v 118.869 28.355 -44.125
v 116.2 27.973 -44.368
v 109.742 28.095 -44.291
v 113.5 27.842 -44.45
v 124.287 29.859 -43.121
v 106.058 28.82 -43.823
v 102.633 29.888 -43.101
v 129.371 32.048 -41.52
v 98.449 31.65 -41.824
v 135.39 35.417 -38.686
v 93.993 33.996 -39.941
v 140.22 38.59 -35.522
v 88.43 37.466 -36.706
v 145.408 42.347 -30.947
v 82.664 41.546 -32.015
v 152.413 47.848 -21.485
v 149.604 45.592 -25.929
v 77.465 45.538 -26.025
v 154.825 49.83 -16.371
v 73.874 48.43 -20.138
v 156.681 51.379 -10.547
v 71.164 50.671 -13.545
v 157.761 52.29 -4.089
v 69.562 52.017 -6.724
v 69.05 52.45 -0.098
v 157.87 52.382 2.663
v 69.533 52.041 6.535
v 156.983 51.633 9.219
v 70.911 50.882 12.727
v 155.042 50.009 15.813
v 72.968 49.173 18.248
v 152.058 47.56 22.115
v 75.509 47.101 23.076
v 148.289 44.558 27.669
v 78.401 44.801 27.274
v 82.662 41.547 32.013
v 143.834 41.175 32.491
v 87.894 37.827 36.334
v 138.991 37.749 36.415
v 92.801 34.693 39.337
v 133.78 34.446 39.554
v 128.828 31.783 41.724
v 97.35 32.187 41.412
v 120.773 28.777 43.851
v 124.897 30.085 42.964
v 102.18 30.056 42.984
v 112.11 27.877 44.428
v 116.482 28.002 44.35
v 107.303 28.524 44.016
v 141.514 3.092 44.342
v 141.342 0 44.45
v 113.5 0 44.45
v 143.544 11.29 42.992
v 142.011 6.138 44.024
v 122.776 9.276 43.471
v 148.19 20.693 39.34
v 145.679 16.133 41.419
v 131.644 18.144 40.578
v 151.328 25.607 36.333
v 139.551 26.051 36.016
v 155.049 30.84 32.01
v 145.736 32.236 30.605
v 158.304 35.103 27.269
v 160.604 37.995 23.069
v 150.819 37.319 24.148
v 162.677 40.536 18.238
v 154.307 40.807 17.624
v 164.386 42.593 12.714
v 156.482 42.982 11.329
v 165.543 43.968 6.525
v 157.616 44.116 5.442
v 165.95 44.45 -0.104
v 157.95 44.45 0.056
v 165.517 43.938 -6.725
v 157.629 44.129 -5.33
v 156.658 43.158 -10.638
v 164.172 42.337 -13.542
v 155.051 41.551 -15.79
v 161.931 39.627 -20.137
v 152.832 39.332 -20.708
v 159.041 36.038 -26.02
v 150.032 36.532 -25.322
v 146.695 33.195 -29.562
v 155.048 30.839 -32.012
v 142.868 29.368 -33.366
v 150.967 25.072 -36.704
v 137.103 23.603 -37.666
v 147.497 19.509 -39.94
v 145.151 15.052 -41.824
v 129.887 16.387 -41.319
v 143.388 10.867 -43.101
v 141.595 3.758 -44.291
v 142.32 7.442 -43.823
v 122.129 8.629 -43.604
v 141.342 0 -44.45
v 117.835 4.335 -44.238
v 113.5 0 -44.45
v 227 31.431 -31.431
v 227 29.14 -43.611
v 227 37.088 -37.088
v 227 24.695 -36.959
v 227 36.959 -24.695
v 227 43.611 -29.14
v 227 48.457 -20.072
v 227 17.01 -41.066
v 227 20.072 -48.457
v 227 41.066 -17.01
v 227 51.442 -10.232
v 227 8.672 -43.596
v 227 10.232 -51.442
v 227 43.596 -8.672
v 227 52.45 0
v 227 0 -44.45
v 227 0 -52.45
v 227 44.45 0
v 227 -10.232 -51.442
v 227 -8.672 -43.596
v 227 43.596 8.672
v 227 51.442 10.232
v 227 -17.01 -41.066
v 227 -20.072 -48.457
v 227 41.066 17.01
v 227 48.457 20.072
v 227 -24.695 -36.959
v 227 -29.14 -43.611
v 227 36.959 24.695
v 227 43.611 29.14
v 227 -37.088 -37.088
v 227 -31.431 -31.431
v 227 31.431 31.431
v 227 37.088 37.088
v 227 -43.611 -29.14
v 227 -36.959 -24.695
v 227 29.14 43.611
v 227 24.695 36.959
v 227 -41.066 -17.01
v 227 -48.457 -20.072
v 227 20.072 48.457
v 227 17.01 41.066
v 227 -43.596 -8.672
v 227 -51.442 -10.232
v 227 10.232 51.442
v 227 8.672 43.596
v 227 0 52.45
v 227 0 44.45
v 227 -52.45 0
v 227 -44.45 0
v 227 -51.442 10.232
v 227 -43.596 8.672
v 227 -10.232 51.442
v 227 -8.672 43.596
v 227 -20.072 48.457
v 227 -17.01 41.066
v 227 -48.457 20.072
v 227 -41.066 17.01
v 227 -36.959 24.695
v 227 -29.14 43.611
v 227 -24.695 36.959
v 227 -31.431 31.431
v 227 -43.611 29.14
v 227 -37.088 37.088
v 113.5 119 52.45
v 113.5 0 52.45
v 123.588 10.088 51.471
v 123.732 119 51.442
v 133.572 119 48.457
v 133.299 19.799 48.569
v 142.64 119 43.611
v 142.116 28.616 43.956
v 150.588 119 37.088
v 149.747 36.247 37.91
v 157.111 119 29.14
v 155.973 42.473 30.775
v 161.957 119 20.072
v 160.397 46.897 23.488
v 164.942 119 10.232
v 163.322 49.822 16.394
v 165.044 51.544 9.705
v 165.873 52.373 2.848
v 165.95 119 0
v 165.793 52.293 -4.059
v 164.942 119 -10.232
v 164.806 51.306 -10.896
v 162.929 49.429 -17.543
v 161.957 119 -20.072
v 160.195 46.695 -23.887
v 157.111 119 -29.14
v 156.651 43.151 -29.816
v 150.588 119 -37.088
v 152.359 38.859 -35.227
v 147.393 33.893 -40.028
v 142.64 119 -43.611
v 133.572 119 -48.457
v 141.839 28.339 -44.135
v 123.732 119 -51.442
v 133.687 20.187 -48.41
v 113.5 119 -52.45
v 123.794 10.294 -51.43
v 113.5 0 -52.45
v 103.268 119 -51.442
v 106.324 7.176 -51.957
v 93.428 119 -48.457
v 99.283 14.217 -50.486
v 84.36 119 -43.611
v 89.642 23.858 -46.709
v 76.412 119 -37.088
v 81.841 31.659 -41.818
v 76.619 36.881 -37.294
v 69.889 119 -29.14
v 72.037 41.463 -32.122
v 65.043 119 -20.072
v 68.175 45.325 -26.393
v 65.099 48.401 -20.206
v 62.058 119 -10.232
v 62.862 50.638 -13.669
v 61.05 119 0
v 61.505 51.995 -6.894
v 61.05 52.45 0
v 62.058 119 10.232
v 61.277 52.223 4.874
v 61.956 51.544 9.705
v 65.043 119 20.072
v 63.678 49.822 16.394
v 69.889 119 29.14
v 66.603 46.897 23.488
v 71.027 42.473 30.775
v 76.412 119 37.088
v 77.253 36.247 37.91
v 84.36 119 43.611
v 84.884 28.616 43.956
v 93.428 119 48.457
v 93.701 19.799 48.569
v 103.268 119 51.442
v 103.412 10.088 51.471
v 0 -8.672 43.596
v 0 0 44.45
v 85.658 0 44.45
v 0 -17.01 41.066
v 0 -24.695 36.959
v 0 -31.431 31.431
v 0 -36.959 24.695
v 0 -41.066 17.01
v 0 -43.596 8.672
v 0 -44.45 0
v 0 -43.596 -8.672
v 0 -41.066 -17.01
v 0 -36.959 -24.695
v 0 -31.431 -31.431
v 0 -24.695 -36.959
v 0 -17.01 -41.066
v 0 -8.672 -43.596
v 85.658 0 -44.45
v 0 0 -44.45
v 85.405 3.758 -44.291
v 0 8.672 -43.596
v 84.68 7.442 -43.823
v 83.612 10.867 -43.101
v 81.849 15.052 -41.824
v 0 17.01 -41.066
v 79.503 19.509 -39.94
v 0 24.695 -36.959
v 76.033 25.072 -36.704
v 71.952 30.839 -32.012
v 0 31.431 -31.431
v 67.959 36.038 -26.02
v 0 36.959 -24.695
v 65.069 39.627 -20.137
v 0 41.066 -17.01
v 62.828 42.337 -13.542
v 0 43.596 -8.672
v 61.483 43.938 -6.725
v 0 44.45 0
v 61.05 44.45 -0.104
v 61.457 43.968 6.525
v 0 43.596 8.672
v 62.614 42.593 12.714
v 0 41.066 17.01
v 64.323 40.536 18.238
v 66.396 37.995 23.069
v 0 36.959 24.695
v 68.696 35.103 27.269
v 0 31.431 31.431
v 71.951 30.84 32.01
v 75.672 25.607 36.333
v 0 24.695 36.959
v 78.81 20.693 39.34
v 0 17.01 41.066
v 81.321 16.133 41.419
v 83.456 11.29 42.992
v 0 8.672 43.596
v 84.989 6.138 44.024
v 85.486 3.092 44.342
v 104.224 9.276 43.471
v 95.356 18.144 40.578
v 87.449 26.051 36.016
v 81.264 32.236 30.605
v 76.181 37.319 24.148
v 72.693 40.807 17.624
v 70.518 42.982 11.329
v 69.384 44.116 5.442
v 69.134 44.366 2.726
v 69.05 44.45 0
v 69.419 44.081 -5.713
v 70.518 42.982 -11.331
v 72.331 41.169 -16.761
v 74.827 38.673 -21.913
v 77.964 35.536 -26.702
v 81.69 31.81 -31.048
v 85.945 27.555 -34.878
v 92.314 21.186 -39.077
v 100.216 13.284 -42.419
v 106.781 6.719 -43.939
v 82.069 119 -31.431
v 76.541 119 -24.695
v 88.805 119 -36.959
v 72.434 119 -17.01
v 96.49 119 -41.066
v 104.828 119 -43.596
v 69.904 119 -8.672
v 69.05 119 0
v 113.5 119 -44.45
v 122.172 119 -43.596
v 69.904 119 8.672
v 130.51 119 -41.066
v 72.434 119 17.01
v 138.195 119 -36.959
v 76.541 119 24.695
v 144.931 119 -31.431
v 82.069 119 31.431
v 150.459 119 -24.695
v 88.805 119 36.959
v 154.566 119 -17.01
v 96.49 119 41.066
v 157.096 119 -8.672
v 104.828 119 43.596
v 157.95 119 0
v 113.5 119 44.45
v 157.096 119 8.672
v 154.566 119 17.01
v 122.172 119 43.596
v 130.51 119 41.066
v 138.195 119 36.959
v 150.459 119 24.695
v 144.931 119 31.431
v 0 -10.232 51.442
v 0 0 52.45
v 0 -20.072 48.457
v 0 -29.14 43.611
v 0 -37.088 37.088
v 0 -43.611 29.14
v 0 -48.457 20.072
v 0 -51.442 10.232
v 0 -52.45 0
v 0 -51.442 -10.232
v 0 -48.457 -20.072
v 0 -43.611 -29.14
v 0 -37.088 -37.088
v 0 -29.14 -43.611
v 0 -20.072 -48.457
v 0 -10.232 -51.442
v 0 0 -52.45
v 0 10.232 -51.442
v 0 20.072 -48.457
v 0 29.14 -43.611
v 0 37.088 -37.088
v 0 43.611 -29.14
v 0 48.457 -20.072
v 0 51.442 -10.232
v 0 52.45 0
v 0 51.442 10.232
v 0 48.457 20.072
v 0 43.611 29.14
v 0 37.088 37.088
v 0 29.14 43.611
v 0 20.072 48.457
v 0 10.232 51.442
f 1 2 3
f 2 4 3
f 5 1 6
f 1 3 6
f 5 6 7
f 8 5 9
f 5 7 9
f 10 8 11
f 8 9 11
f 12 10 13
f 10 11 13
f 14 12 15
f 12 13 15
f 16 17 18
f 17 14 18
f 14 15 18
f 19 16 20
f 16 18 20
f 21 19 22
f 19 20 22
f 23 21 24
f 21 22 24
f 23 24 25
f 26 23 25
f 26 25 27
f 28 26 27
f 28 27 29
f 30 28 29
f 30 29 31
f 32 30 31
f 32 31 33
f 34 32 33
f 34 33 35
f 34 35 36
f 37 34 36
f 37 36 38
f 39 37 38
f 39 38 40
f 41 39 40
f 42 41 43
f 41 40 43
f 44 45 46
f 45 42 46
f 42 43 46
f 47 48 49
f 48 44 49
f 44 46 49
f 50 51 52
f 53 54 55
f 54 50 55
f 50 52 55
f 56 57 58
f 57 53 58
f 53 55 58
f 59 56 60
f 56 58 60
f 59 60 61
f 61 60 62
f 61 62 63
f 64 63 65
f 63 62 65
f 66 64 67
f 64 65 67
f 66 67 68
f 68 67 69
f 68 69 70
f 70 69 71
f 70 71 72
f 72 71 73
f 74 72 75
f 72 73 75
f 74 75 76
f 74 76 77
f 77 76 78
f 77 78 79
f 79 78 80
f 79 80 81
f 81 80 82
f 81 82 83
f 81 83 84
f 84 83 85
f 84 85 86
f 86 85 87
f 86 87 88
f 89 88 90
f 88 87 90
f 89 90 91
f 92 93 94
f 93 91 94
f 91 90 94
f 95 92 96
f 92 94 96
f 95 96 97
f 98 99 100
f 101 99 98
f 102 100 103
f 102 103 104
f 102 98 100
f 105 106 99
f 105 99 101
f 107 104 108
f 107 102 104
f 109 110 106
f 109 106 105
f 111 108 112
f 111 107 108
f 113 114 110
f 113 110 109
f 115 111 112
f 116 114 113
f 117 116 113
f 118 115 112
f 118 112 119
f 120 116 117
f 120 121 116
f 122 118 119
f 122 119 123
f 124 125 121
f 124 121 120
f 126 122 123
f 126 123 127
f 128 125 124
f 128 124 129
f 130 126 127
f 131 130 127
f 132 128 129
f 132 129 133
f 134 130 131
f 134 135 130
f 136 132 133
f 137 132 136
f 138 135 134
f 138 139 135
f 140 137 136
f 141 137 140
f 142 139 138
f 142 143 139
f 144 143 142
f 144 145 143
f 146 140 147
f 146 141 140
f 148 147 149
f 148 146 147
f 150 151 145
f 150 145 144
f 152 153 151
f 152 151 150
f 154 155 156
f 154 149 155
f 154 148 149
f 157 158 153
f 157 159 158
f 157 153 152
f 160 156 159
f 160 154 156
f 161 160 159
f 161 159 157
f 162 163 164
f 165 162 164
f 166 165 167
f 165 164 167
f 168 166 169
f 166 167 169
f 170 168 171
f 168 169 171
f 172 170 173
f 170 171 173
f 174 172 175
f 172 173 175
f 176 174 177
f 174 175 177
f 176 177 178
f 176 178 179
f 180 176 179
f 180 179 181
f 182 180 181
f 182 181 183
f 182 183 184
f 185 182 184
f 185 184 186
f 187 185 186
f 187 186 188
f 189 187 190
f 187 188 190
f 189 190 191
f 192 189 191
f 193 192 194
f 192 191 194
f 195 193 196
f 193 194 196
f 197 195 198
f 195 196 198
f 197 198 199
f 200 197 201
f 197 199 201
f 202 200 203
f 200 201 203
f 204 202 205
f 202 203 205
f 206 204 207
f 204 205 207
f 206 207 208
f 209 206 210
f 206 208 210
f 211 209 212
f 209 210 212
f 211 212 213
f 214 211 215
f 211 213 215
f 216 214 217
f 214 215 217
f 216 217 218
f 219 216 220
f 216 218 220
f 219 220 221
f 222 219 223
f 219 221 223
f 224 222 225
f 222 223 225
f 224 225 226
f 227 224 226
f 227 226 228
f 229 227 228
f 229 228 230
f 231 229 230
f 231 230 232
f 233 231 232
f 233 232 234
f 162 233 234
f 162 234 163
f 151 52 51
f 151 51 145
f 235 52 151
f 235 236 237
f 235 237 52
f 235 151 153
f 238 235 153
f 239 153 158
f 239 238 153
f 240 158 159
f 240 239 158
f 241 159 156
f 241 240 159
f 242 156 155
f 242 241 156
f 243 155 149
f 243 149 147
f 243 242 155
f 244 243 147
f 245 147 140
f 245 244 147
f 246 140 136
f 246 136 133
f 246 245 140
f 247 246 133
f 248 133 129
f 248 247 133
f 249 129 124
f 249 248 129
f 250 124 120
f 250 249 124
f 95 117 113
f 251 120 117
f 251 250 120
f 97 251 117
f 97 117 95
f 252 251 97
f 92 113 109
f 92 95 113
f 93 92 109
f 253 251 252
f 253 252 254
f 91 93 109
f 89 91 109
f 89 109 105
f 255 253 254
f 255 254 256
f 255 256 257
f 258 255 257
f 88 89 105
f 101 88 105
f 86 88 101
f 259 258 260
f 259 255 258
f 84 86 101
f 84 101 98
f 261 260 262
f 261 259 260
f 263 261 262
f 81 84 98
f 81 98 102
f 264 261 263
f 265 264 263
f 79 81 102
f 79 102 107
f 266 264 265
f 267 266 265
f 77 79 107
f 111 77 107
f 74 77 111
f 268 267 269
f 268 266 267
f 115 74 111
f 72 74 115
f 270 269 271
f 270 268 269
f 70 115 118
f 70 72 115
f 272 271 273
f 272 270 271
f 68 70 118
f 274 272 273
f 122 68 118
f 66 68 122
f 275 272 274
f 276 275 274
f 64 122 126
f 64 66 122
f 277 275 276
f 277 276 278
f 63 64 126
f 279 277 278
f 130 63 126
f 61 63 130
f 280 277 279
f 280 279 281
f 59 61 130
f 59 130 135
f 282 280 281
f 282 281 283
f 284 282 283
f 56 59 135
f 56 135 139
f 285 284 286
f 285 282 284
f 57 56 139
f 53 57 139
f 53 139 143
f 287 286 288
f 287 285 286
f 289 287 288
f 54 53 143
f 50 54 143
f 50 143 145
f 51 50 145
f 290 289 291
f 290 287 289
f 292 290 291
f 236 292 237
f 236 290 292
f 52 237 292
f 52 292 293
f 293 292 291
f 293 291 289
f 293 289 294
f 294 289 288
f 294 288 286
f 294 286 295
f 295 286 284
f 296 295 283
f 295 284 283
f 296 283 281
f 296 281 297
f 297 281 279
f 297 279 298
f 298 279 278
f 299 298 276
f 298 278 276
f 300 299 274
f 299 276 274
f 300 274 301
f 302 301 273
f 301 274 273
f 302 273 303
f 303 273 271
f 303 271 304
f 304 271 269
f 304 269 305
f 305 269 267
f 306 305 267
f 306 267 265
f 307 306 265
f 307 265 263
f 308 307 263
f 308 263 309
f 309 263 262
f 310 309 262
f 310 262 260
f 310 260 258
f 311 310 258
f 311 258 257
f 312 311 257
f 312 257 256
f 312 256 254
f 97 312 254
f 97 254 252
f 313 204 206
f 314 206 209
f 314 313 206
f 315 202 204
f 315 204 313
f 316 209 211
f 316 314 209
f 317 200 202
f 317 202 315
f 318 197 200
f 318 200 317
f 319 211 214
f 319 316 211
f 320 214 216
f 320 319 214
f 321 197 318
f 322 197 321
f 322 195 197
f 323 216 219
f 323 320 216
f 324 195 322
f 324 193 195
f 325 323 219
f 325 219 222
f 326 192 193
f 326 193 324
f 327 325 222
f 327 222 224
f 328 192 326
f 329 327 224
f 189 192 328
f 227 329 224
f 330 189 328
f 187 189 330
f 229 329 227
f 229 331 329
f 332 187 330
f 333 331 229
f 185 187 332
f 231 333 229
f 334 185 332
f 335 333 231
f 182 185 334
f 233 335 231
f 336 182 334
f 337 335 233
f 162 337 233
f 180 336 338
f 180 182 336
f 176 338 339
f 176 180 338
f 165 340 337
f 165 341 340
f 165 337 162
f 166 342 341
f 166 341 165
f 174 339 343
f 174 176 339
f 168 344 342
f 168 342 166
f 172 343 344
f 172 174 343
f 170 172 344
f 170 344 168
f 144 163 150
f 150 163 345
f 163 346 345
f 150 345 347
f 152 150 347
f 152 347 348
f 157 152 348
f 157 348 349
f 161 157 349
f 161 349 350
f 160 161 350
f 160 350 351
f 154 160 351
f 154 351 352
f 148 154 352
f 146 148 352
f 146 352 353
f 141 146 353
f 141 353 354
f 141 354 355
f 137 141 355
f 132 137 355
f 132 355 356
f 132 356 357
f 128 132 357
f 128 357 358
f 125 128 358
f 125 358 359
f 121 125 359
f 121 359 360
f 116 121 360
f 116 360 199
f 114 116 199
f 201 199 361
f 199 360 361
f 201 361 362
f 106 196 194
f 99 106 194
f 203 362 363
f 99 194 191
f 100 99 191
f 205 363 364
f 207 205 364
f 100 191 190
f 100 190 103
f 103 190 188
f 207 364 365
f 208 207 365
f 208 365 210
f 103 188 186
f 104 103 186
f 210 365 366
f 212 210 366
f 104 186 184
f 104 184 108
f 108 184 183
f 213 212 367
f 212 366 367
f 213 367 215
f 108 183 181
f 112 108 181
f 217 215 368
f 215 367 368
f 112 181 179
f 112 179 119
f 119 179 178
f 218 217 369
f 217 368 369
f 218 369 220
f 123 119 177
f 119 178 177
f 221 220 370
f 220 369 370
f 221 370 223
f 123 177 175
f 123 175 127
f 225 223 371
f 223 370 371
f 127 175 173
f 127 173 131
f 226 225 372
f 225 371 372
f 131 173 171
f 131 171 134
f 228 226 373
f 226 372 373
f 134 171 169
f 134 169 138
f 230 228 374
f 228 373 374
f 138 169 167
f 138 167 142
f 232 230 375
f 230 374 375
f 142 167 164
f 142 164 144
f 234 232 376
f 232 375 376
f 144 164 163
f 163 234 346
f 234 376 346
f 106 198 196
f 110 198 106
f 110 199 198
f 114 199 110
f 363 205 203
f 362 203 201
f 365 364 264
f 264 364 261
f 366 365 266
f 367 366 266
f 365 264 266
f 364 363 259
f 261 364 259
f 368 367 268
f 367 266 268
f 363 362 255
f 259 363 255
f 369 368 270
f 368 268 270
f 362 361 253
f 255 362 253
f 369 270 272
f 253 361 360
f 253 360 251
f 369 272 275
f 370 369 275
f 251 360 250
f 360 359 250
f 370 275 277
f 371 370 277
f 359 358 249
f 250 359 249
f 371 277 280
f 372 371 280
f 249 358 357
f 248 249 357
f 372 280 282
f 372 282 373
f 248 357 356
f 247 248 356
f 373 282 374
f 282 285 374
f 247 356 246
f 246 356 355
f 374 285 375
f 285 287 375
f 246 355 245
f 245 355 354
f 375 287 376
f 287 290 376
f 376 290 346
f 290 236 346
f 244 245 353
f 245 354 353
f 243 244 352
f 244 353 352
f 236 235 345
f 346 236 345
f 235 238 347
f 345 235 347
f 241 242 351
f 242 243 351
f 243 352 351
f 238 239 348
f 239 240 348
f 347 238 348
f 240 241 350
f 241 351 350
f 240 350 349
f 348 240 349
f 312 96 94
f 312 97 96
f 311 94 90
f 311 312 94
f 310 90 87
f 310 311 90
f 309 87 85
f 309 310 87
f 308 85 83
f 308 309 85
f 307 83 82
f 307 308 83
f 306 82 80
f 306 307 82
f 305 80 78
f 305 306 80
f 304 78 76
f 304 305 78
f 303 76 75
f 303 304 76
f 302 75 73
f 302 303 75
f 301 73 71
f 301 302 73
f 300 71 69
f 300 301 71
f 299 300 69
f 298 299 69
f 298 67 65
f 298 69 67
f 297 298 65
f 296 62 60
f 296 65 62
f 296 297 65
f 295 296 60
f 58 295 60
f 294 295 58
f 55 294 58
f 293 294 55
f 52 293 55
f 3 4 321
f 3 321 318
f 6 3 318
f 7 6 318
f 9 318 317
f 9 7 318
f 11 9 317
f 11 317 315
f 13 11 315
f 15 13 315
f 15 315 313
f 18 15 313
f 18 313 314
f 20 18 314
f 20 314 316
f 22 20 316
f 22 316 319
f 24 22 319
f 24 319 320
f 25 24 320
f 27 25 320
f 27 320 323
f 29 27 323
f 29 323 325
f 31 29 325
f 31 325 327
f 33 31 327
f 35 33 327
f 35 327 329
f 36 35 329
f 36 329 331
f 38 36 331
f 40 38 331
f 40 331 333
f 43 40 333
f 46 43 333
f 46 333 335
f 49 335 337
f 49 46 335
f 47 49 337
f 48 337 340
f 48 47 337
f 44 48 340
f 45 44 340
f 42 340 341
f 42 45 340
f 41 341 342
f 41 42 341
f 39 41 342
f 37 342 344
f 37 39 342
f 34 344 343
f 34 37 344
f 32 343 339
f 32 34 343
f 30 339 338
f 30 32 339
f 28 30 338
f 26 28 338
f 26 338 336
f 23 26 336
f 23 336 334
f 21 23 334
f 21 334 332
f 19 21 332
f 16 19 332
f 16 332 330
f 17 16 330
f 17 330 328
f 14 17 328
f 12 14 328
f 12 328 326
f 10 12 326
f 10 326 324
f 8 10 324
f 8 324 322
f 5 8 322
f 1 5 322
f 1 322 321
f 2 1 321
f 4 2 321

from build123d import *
from build123d.topology import SkipClean

# Parameters (mm, degrees)
CROQUIS1_R              = 52.45
CROQUIS1_R_2            = 44.45
SALIENTE_EXTRUIR1_DEPTH = 227
CROQUIS2_R              = 52.45
CROQUIS2_R_2            = 44.45
SALIENTE_EXTRUIR2_DEPTH = 119
CROQUIS3_R              = 44.45
CORTAR_EXTRUIR1_DEPTH   = 227


with BuildPart() as part:
    # Croquis1 → Saliente-Extruir1 (new body)
    with BuildSketch(Plane(origin=(0, 0, 0), x_dir=(0, 0, -1), z_dir=(1, 0, 0))):
        with Locations(Location((0, 0, 0), (0, 0, 180))):
            Circle(CROQUIS1_R)
        with Locations(Location((0, 0, 0), (0, 0, 180))):
            Circle(CROQUIS1_R_2, mode=Mode.SUBTRACT)
    extrude(amount=SALIENTE_EXTRUIR1_DEPTH)

    # Croquis2 → Saliente-Extruir2 (add)
    with BuildSketch(Plane(origin=(0, 0, 0), x_dir=(1, 0, 0), z_dir=(0, 1, 0))):
        with Locations(Location((113.5, 0, 0), (0, 0, 270))):
            Circle(CROQUIS2_R)
        with Locations(Location((113.5, 0, 0), (0, 0, 90))):
            Circle(CROQUIS2_R_2, mode=Mode.SUBTRACT)
    extrude(amount=SALIENTE_EXTRUIR2_DEPTH)

    # Croquis3 → Cortar-Extruir1 (cut)
    with SkipClean():  # the faces are left unmerged after this step: merging them gives an invalid solid
        with BuildSketch(Plane.ZY):
            Circle(CROQUIS3_R)
        extrude(amount=-CORTAR_EXTRUIR1_DEPTH, mode=Mode.SUBTRACT)


solid = part.part
